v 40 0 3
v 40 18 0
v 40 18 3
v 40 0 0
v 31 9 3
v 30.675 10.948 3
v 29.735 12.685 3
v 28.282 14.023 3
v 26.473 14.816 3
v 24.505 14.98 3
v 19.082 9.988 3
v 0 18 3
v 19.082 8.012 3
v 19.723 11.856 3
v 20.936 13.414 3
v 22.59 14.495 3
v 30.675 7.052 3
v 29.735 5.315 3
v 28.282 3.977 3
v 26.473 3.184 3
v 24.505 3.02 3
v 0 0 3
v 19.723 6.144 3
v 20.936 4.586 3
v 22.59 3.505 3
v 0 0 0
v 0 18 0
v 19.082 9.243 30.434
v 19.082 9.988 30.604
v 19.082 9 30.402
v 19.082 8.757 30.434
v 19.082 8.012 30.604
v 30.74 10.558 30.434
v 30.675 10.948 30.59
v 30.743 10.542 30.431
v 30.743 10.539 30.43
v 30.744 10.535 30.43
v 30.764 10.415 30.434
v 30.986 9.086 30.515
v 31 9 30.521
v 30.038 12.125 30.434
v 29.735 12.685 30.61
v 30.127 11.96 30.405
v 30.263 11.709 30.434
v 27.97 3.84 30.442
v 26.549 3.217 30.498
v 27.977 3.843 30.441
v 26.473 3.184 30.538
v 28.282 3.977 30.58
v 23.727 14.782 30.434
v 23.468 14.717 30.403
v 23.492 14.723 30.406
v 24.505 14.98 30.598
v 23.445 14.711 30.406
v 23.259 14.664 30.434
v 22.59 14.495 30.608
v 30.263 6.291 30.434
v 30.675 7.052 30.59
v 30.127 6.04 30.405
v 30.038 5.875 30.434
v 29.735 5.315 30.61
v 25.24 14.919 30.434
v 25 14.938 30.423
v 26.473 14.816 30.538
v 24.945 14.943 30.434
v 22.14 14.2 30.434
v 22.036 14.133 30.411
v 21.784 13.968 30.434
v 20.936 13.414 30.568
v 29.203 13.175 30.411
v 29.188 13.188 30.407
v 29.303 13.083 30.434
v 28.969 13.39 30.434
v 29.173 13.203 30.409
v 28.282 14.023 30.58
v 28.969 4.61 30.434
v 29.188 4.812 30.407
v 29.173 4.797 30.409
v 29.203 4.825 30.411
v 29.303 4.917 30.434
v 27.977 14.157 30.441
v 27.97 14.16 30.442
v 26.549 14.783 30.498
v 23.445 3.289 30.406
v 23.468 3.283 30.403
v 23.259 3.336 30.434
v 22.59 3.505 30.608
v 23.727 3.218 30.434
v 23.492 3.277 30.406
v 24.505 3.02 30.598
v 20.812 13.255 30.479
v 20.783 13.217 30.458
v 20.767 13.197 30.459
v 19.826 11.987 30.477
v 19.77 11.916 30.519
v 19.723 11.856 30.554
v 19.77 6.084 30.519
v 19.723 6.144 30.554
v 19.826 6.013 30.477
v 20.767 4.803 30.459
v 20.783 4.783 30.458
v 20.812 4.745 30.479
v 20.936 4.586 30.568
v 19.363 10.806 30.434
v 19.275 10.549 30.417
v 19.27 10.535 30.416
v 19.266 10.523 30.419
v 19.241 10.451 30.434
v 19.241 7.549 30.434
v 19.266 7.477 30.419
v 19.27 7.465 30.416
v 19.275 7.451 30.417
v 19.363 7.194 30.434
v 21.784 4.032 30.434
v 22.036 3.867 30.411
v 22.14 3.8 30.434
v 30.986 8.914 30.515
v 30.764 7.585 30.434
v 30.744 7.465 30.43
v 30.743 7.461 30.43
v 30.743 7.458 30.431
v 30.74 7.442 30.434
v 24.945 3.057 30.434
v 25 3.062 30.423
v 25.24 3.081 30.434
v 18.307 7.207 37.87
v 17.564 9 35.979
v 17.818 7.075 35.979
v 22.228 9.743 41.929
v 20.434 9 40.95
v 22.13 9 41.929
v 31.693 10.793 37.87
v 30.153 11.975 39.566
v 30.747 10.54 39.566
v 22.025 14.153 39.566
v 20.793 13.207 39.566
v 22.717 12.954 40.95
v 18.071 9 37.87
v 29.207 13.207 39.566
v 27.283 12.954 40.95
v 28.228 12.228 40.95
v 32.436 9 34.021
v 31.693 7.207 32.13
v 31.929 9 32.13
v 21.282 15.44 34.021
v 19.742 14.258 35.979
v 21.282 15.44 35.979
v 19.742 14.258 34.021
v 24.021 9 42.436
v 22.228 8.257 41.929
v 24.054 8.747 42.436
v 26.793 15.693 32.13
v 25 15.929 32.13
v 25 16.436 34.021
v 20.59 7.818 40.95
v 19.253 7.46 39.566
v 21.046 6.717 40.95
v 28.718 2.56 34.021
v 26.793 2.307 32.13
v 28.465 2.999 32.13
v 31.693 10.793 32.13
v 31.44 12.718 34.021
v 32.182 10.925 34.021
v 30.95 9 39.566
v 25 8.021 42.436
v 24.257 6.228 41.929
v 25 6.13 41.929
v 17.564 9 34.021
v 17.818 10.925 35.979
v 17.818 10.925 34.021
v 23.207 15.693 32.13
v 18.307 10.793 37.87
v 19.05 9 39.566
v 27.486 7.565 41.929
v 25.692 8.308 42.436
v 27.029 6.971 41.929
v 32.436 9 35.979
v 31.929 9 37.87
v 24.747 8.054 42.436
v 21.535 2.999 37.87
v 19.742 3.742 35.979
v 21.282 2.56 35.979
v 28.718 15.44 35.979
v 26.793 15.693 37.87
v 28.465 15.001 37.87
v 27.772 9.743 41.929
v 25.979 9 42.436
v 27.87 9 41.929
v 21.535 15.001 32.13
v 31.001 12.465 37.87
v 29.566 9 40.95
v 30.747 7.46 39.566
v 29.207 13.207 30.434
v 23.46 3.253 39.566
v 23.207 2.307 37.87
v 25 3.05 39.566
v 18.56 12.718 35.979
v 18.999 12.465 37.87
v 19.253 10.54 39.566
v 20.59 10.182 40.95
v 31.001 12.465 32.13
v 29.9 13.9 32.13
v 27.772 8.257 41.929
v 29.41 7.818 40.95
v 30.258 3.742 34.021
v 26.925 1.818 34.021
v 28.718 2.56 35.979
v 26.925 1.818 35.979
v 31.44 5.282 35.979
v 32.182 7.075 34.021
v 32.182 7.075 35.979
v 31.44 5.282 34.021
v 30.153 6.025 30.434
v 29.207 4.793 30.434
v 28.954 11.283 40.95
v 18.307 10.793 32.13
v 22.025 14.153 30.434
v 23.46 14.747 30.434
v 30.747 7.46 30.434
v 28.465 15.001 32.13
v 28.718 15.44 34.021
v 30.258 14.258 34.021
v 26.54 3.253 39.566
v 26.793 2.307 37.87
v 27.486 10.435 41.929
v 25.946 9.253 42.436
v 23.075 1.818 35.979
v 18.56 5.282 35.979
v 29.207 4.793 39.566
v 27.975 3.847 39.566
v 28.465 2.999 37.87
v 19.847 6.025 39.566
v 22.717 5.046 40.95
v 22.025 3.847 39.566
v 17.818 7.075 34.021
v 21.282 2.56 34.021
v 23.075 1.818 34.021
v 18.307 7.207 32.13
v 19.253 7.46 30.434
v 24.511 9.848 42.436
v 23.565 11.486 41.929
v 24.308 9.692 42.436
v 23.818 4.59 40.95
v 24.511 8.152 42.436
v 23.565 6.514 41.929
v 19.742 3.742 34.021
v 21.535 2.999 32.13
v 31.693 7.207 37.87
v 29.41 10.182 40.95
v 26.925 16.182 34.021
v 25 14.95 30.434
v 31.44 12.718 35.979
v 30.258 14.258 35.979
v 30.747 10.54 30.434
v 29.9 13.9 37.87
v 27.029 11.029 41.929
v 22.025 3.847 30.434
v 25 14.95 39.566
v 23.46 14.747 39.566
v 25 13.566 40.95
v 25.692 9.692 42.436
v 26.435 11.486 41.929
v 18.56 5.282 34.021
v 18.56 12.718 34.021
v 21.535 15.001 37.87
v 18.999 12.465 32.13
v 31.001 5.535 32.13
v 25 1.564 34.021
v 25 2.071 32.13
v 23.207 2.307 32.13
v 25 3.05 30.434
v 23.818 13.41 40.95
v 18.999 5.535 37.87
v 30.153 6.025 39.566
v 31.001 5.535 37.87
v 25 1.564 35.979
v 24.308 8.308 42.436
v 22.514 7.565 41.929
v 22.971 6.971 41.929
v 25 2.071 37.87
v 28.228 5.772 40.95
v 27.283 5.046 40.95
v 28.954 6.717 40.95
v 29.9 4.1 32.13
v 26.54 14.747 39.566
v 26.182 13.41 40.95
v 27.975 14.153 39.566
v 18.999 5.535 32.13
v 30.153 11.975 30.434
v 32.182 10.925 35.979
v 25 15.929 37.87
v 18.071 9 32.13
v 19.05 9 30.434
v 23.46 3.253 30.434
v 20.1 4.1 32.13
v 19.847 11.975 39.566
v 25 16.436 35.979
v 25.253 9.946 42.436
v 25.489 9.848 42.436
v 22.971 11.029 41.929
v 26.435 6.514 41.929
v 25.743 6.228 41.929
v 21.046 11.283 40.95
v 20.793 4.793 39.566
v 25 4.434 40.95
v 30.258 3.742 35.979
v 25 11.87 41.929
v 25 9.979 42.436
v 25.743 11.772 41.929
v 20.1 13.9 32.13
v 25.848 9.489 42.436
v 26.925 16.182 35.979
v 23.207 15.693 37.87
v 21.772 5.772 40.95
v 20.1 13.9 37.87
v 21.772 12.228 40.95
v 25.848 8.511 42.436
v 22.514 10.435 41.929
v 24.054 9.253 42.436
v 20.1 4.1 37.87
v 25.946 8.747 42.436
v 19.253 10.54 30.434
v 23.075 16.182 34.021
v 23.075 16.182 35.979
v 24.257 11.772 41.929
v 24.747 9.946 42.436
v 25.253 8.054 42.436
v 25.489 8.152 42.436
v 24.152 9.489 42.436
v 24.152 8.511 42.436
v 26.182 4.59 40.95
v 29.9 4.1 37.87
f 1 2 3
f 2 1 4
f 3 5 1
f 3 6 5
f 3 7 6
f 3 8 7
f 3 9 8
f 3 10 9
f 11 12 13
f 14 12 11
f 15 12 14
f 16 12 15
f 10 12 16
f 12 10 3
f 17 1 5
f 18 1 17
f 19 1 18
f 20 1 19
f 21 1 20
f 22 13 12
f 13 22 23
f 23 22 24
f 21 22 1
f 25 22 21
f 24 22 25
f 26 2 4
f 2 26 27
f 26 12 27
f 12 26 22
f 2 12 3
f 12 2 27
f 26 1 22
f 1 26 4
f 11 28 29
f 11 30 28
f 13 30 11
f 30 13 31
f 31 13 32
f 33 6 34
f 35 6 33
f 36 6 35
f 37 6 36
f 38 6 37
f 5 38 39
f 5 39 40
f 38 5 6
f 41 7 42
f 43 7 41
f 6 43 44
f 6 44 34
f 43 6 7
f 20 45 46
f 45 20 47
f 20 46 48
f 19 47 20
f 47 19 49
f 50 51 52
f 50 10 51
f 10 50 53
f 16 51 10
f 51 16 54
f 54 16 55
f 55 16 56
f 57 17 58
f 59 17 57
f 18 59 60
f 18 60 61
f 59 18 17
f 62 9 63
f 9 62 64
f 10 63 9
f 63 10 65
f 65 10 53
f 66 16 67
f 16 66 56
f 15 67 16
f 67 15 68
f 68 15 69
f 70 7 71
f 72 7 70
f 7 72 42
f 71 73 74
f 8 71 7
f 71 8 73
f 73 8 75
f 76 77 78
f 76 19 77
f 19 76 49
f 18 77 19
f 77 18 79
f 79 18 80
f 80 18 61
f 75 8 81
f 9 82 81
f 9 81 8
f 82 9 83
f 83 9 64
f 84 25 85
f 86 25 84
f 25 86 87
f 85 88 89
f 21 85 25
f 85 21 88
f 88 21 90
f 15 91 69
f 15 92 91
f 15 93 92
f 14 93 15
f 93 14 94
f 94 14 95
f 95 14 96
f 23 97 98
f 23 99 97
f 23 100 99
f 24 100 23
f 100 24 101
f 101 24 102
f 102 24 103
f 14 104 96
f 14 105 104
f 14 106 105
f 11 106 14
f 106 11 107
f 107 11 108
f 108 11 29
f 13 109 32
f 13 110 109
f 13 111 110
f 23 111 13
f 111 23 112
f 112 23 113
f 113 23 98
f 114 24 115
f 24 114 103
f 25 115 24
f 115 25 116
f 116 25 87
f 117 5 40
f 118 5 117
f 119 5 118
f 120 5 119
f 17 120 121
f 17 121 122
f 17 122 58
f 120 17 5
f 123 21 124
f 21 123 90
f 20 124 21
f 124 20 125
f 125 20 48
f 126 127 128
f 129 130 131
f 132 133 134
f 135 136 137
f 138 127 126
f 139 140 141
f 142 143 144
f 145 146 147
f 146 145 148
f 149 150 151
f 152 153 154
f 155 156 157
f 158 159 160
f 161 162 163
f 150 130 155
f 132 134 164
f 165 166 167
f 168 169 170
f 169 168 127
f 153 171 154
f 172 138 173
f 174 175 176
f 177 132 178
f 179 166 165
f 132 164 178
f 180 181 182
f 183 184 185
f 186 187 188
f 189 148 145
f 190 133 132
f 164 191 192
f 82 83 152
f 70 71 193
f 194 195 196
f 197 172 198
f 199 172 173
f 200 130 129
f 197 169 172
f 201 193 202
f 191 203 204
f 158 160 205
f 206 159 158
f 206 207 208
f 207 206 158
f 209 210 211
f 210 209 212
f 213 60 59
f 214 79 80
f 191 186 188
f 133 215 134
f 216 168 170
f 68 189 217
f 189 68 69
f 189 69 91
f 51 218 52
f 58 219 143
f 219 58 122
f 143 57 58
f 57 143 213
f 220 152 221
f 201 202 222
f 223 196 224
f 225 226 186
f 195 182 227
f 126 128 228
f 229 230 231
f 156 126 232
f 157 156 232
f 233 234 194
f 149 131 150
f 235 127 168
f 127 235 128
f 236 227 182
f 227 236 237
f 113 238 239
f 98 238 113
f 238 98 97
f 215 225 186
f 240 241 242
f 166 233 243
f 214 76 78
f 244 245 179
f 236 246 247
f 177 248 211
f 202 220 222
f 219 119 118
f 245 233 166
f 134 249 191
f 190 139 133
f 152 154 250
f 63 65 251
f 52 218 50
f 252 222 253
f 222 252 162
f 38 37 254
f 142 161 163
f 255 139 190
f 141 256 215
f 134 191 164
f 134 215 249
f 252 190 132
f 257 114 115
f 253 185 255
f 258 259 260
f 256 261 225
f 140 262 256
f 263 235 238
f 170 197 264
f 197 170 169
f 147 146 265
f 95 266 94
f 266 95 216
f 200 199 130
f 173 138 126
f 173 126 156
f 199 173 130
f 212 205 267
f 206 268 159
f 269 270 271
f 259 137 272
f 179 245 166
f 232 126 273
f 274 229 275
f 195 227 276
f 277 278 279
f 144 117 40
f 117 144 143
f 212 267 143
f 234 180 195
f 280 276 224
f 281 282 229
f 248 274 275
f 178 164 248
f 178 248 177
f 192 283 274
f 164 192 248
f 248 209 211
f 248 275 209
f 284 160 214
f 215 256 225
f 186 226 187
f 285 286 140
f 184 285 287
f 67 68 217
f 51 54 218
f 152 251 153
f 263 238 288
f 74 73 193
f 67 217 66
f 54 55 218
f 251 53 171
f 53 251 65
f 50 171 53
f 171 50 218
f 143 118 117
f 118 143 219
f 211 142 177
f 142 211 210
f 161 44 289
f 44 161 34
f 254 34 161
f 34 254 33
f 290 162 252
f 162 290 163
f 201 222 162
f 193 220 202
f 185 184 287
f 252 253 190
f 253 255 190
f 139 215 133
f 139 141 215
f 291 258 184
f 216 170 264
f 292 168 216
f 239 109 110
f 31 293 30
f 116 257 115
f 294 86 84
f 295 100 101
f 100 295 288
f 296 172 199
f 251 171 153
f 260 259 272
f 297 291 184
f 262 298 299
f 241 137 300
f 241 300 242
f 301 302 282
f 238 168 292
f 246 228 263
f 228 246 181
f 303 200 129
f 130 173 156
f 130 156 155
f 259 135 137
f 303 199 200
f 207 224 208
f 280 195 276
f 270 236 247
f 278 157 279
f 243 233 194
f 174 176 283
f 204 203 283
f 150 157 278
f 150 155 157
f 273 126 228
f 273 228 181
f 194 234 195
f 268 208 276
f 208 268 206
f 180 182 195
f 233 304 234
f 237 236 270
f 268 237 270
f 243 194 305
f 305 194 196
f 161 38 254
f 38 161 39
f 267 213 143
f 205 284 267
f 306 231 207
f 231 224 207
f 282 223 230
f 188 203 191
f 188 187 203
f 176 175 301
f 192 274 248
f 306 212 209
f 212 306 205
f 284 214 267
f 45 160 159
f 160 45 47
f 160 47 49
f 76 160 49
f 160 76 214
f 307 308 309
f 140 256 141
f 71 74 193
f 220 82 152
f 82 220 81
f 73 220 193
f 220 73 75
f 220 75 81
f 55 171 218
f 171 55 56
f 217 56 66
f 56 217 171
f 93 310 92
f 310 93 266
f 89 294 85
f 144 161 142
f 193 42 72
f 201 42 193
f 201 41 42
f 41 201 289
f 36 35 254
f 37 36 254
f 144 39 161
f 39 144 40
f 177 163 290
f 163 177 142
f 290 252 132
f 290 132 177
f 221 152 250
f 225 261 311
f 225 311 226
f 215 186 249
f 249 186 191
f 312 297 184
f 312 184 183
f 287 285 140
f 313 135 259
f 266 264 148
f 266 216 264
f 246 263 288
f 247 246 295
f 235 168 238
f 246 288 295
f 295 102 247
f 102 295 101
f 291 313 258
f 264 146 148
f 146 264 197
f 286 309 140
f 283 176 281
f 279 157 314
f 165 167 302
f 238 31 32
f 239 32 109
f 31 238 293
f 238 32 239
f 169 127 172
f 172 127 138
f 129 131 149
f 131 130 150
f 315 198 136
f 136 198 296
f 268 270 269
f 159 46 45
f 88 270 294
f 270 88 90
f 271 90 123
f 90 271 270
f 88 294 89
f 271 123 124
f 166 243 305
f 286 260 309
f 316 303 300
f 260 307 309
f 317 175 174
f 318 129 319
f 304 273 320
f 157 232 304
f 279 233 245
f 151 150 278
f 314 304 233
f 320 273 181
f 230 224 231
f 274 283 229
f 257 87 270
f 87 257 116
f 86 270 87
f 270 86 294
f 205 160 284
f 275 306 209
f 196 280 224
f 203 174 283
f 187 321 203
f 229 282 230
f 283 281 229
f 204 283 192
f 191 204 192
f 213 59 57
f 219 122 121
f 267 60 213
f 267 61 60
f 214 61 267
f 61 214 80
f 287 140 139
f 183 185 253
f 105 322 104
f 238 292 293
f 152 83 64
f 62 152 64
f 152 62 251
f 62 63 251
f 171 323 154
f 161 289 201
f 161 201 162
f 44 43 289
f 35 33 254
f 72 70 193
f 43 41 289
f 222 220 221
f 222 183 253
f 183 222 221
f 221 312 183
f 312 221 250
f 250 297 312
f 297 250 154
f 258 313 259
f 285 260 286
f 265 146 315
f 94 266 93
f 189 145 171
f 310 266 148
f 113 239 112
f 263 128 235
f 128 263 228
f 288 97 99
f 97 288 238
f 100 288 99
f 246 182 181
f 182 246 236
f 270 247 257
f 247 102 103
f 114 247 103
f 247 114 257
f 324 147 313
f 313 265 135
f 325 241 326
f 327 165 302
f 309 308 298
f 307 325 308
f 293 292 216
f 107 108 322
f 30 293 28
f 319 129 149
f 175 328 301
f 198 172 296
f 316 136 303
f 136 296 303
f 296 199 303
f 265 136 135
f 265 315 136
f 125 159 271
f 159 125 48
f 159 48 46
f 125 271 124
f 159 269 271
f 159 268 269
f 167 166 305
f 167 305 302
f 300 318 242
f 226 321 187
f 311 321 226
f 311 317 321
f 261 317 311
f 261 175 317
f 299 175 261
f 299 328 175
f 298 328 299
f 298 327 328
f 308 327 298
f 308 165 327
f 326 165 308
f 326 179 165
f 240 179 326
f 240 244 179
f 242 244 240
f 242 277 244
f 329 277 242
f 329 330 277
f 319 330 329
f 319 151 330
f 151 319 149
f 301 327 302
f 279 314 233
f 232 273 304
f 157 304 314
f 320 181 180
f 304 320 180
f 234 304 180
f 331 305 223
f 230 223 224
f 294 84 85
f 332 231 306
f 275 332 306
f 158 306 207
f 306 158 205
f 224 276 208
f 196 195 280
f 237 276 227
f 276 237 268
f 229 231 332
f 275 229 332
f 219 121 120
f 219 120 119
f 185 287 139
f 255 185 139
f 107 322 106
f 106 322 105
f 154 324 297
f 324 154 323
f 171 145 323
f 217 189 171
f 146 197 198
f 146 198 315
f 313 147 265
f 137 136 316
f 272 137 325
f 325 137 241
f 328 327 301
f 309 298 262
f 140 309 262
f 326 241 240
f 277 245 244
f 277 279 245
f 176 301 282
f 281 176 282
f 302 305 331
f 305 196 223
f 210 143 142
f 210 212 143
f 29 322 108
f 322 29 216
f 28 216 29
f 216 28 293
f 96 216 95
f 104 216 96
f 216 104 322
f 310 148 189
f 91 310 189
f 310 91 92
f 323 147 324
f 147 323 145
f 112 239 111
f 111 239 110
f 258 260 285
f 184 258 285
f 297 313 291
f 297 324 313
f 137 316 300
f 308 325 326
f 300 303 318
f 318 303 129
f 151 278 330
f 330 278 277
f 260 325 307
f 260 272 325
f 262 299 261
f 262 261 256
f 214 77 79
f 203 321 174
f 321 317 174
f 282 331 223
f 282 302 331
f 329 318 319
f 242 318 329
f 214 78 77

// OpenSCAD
cube([40,18,3]);
translate([25,9,0]) cylinder(d=12, h=35);
translate([25,9,35]) sphere(d=15);
